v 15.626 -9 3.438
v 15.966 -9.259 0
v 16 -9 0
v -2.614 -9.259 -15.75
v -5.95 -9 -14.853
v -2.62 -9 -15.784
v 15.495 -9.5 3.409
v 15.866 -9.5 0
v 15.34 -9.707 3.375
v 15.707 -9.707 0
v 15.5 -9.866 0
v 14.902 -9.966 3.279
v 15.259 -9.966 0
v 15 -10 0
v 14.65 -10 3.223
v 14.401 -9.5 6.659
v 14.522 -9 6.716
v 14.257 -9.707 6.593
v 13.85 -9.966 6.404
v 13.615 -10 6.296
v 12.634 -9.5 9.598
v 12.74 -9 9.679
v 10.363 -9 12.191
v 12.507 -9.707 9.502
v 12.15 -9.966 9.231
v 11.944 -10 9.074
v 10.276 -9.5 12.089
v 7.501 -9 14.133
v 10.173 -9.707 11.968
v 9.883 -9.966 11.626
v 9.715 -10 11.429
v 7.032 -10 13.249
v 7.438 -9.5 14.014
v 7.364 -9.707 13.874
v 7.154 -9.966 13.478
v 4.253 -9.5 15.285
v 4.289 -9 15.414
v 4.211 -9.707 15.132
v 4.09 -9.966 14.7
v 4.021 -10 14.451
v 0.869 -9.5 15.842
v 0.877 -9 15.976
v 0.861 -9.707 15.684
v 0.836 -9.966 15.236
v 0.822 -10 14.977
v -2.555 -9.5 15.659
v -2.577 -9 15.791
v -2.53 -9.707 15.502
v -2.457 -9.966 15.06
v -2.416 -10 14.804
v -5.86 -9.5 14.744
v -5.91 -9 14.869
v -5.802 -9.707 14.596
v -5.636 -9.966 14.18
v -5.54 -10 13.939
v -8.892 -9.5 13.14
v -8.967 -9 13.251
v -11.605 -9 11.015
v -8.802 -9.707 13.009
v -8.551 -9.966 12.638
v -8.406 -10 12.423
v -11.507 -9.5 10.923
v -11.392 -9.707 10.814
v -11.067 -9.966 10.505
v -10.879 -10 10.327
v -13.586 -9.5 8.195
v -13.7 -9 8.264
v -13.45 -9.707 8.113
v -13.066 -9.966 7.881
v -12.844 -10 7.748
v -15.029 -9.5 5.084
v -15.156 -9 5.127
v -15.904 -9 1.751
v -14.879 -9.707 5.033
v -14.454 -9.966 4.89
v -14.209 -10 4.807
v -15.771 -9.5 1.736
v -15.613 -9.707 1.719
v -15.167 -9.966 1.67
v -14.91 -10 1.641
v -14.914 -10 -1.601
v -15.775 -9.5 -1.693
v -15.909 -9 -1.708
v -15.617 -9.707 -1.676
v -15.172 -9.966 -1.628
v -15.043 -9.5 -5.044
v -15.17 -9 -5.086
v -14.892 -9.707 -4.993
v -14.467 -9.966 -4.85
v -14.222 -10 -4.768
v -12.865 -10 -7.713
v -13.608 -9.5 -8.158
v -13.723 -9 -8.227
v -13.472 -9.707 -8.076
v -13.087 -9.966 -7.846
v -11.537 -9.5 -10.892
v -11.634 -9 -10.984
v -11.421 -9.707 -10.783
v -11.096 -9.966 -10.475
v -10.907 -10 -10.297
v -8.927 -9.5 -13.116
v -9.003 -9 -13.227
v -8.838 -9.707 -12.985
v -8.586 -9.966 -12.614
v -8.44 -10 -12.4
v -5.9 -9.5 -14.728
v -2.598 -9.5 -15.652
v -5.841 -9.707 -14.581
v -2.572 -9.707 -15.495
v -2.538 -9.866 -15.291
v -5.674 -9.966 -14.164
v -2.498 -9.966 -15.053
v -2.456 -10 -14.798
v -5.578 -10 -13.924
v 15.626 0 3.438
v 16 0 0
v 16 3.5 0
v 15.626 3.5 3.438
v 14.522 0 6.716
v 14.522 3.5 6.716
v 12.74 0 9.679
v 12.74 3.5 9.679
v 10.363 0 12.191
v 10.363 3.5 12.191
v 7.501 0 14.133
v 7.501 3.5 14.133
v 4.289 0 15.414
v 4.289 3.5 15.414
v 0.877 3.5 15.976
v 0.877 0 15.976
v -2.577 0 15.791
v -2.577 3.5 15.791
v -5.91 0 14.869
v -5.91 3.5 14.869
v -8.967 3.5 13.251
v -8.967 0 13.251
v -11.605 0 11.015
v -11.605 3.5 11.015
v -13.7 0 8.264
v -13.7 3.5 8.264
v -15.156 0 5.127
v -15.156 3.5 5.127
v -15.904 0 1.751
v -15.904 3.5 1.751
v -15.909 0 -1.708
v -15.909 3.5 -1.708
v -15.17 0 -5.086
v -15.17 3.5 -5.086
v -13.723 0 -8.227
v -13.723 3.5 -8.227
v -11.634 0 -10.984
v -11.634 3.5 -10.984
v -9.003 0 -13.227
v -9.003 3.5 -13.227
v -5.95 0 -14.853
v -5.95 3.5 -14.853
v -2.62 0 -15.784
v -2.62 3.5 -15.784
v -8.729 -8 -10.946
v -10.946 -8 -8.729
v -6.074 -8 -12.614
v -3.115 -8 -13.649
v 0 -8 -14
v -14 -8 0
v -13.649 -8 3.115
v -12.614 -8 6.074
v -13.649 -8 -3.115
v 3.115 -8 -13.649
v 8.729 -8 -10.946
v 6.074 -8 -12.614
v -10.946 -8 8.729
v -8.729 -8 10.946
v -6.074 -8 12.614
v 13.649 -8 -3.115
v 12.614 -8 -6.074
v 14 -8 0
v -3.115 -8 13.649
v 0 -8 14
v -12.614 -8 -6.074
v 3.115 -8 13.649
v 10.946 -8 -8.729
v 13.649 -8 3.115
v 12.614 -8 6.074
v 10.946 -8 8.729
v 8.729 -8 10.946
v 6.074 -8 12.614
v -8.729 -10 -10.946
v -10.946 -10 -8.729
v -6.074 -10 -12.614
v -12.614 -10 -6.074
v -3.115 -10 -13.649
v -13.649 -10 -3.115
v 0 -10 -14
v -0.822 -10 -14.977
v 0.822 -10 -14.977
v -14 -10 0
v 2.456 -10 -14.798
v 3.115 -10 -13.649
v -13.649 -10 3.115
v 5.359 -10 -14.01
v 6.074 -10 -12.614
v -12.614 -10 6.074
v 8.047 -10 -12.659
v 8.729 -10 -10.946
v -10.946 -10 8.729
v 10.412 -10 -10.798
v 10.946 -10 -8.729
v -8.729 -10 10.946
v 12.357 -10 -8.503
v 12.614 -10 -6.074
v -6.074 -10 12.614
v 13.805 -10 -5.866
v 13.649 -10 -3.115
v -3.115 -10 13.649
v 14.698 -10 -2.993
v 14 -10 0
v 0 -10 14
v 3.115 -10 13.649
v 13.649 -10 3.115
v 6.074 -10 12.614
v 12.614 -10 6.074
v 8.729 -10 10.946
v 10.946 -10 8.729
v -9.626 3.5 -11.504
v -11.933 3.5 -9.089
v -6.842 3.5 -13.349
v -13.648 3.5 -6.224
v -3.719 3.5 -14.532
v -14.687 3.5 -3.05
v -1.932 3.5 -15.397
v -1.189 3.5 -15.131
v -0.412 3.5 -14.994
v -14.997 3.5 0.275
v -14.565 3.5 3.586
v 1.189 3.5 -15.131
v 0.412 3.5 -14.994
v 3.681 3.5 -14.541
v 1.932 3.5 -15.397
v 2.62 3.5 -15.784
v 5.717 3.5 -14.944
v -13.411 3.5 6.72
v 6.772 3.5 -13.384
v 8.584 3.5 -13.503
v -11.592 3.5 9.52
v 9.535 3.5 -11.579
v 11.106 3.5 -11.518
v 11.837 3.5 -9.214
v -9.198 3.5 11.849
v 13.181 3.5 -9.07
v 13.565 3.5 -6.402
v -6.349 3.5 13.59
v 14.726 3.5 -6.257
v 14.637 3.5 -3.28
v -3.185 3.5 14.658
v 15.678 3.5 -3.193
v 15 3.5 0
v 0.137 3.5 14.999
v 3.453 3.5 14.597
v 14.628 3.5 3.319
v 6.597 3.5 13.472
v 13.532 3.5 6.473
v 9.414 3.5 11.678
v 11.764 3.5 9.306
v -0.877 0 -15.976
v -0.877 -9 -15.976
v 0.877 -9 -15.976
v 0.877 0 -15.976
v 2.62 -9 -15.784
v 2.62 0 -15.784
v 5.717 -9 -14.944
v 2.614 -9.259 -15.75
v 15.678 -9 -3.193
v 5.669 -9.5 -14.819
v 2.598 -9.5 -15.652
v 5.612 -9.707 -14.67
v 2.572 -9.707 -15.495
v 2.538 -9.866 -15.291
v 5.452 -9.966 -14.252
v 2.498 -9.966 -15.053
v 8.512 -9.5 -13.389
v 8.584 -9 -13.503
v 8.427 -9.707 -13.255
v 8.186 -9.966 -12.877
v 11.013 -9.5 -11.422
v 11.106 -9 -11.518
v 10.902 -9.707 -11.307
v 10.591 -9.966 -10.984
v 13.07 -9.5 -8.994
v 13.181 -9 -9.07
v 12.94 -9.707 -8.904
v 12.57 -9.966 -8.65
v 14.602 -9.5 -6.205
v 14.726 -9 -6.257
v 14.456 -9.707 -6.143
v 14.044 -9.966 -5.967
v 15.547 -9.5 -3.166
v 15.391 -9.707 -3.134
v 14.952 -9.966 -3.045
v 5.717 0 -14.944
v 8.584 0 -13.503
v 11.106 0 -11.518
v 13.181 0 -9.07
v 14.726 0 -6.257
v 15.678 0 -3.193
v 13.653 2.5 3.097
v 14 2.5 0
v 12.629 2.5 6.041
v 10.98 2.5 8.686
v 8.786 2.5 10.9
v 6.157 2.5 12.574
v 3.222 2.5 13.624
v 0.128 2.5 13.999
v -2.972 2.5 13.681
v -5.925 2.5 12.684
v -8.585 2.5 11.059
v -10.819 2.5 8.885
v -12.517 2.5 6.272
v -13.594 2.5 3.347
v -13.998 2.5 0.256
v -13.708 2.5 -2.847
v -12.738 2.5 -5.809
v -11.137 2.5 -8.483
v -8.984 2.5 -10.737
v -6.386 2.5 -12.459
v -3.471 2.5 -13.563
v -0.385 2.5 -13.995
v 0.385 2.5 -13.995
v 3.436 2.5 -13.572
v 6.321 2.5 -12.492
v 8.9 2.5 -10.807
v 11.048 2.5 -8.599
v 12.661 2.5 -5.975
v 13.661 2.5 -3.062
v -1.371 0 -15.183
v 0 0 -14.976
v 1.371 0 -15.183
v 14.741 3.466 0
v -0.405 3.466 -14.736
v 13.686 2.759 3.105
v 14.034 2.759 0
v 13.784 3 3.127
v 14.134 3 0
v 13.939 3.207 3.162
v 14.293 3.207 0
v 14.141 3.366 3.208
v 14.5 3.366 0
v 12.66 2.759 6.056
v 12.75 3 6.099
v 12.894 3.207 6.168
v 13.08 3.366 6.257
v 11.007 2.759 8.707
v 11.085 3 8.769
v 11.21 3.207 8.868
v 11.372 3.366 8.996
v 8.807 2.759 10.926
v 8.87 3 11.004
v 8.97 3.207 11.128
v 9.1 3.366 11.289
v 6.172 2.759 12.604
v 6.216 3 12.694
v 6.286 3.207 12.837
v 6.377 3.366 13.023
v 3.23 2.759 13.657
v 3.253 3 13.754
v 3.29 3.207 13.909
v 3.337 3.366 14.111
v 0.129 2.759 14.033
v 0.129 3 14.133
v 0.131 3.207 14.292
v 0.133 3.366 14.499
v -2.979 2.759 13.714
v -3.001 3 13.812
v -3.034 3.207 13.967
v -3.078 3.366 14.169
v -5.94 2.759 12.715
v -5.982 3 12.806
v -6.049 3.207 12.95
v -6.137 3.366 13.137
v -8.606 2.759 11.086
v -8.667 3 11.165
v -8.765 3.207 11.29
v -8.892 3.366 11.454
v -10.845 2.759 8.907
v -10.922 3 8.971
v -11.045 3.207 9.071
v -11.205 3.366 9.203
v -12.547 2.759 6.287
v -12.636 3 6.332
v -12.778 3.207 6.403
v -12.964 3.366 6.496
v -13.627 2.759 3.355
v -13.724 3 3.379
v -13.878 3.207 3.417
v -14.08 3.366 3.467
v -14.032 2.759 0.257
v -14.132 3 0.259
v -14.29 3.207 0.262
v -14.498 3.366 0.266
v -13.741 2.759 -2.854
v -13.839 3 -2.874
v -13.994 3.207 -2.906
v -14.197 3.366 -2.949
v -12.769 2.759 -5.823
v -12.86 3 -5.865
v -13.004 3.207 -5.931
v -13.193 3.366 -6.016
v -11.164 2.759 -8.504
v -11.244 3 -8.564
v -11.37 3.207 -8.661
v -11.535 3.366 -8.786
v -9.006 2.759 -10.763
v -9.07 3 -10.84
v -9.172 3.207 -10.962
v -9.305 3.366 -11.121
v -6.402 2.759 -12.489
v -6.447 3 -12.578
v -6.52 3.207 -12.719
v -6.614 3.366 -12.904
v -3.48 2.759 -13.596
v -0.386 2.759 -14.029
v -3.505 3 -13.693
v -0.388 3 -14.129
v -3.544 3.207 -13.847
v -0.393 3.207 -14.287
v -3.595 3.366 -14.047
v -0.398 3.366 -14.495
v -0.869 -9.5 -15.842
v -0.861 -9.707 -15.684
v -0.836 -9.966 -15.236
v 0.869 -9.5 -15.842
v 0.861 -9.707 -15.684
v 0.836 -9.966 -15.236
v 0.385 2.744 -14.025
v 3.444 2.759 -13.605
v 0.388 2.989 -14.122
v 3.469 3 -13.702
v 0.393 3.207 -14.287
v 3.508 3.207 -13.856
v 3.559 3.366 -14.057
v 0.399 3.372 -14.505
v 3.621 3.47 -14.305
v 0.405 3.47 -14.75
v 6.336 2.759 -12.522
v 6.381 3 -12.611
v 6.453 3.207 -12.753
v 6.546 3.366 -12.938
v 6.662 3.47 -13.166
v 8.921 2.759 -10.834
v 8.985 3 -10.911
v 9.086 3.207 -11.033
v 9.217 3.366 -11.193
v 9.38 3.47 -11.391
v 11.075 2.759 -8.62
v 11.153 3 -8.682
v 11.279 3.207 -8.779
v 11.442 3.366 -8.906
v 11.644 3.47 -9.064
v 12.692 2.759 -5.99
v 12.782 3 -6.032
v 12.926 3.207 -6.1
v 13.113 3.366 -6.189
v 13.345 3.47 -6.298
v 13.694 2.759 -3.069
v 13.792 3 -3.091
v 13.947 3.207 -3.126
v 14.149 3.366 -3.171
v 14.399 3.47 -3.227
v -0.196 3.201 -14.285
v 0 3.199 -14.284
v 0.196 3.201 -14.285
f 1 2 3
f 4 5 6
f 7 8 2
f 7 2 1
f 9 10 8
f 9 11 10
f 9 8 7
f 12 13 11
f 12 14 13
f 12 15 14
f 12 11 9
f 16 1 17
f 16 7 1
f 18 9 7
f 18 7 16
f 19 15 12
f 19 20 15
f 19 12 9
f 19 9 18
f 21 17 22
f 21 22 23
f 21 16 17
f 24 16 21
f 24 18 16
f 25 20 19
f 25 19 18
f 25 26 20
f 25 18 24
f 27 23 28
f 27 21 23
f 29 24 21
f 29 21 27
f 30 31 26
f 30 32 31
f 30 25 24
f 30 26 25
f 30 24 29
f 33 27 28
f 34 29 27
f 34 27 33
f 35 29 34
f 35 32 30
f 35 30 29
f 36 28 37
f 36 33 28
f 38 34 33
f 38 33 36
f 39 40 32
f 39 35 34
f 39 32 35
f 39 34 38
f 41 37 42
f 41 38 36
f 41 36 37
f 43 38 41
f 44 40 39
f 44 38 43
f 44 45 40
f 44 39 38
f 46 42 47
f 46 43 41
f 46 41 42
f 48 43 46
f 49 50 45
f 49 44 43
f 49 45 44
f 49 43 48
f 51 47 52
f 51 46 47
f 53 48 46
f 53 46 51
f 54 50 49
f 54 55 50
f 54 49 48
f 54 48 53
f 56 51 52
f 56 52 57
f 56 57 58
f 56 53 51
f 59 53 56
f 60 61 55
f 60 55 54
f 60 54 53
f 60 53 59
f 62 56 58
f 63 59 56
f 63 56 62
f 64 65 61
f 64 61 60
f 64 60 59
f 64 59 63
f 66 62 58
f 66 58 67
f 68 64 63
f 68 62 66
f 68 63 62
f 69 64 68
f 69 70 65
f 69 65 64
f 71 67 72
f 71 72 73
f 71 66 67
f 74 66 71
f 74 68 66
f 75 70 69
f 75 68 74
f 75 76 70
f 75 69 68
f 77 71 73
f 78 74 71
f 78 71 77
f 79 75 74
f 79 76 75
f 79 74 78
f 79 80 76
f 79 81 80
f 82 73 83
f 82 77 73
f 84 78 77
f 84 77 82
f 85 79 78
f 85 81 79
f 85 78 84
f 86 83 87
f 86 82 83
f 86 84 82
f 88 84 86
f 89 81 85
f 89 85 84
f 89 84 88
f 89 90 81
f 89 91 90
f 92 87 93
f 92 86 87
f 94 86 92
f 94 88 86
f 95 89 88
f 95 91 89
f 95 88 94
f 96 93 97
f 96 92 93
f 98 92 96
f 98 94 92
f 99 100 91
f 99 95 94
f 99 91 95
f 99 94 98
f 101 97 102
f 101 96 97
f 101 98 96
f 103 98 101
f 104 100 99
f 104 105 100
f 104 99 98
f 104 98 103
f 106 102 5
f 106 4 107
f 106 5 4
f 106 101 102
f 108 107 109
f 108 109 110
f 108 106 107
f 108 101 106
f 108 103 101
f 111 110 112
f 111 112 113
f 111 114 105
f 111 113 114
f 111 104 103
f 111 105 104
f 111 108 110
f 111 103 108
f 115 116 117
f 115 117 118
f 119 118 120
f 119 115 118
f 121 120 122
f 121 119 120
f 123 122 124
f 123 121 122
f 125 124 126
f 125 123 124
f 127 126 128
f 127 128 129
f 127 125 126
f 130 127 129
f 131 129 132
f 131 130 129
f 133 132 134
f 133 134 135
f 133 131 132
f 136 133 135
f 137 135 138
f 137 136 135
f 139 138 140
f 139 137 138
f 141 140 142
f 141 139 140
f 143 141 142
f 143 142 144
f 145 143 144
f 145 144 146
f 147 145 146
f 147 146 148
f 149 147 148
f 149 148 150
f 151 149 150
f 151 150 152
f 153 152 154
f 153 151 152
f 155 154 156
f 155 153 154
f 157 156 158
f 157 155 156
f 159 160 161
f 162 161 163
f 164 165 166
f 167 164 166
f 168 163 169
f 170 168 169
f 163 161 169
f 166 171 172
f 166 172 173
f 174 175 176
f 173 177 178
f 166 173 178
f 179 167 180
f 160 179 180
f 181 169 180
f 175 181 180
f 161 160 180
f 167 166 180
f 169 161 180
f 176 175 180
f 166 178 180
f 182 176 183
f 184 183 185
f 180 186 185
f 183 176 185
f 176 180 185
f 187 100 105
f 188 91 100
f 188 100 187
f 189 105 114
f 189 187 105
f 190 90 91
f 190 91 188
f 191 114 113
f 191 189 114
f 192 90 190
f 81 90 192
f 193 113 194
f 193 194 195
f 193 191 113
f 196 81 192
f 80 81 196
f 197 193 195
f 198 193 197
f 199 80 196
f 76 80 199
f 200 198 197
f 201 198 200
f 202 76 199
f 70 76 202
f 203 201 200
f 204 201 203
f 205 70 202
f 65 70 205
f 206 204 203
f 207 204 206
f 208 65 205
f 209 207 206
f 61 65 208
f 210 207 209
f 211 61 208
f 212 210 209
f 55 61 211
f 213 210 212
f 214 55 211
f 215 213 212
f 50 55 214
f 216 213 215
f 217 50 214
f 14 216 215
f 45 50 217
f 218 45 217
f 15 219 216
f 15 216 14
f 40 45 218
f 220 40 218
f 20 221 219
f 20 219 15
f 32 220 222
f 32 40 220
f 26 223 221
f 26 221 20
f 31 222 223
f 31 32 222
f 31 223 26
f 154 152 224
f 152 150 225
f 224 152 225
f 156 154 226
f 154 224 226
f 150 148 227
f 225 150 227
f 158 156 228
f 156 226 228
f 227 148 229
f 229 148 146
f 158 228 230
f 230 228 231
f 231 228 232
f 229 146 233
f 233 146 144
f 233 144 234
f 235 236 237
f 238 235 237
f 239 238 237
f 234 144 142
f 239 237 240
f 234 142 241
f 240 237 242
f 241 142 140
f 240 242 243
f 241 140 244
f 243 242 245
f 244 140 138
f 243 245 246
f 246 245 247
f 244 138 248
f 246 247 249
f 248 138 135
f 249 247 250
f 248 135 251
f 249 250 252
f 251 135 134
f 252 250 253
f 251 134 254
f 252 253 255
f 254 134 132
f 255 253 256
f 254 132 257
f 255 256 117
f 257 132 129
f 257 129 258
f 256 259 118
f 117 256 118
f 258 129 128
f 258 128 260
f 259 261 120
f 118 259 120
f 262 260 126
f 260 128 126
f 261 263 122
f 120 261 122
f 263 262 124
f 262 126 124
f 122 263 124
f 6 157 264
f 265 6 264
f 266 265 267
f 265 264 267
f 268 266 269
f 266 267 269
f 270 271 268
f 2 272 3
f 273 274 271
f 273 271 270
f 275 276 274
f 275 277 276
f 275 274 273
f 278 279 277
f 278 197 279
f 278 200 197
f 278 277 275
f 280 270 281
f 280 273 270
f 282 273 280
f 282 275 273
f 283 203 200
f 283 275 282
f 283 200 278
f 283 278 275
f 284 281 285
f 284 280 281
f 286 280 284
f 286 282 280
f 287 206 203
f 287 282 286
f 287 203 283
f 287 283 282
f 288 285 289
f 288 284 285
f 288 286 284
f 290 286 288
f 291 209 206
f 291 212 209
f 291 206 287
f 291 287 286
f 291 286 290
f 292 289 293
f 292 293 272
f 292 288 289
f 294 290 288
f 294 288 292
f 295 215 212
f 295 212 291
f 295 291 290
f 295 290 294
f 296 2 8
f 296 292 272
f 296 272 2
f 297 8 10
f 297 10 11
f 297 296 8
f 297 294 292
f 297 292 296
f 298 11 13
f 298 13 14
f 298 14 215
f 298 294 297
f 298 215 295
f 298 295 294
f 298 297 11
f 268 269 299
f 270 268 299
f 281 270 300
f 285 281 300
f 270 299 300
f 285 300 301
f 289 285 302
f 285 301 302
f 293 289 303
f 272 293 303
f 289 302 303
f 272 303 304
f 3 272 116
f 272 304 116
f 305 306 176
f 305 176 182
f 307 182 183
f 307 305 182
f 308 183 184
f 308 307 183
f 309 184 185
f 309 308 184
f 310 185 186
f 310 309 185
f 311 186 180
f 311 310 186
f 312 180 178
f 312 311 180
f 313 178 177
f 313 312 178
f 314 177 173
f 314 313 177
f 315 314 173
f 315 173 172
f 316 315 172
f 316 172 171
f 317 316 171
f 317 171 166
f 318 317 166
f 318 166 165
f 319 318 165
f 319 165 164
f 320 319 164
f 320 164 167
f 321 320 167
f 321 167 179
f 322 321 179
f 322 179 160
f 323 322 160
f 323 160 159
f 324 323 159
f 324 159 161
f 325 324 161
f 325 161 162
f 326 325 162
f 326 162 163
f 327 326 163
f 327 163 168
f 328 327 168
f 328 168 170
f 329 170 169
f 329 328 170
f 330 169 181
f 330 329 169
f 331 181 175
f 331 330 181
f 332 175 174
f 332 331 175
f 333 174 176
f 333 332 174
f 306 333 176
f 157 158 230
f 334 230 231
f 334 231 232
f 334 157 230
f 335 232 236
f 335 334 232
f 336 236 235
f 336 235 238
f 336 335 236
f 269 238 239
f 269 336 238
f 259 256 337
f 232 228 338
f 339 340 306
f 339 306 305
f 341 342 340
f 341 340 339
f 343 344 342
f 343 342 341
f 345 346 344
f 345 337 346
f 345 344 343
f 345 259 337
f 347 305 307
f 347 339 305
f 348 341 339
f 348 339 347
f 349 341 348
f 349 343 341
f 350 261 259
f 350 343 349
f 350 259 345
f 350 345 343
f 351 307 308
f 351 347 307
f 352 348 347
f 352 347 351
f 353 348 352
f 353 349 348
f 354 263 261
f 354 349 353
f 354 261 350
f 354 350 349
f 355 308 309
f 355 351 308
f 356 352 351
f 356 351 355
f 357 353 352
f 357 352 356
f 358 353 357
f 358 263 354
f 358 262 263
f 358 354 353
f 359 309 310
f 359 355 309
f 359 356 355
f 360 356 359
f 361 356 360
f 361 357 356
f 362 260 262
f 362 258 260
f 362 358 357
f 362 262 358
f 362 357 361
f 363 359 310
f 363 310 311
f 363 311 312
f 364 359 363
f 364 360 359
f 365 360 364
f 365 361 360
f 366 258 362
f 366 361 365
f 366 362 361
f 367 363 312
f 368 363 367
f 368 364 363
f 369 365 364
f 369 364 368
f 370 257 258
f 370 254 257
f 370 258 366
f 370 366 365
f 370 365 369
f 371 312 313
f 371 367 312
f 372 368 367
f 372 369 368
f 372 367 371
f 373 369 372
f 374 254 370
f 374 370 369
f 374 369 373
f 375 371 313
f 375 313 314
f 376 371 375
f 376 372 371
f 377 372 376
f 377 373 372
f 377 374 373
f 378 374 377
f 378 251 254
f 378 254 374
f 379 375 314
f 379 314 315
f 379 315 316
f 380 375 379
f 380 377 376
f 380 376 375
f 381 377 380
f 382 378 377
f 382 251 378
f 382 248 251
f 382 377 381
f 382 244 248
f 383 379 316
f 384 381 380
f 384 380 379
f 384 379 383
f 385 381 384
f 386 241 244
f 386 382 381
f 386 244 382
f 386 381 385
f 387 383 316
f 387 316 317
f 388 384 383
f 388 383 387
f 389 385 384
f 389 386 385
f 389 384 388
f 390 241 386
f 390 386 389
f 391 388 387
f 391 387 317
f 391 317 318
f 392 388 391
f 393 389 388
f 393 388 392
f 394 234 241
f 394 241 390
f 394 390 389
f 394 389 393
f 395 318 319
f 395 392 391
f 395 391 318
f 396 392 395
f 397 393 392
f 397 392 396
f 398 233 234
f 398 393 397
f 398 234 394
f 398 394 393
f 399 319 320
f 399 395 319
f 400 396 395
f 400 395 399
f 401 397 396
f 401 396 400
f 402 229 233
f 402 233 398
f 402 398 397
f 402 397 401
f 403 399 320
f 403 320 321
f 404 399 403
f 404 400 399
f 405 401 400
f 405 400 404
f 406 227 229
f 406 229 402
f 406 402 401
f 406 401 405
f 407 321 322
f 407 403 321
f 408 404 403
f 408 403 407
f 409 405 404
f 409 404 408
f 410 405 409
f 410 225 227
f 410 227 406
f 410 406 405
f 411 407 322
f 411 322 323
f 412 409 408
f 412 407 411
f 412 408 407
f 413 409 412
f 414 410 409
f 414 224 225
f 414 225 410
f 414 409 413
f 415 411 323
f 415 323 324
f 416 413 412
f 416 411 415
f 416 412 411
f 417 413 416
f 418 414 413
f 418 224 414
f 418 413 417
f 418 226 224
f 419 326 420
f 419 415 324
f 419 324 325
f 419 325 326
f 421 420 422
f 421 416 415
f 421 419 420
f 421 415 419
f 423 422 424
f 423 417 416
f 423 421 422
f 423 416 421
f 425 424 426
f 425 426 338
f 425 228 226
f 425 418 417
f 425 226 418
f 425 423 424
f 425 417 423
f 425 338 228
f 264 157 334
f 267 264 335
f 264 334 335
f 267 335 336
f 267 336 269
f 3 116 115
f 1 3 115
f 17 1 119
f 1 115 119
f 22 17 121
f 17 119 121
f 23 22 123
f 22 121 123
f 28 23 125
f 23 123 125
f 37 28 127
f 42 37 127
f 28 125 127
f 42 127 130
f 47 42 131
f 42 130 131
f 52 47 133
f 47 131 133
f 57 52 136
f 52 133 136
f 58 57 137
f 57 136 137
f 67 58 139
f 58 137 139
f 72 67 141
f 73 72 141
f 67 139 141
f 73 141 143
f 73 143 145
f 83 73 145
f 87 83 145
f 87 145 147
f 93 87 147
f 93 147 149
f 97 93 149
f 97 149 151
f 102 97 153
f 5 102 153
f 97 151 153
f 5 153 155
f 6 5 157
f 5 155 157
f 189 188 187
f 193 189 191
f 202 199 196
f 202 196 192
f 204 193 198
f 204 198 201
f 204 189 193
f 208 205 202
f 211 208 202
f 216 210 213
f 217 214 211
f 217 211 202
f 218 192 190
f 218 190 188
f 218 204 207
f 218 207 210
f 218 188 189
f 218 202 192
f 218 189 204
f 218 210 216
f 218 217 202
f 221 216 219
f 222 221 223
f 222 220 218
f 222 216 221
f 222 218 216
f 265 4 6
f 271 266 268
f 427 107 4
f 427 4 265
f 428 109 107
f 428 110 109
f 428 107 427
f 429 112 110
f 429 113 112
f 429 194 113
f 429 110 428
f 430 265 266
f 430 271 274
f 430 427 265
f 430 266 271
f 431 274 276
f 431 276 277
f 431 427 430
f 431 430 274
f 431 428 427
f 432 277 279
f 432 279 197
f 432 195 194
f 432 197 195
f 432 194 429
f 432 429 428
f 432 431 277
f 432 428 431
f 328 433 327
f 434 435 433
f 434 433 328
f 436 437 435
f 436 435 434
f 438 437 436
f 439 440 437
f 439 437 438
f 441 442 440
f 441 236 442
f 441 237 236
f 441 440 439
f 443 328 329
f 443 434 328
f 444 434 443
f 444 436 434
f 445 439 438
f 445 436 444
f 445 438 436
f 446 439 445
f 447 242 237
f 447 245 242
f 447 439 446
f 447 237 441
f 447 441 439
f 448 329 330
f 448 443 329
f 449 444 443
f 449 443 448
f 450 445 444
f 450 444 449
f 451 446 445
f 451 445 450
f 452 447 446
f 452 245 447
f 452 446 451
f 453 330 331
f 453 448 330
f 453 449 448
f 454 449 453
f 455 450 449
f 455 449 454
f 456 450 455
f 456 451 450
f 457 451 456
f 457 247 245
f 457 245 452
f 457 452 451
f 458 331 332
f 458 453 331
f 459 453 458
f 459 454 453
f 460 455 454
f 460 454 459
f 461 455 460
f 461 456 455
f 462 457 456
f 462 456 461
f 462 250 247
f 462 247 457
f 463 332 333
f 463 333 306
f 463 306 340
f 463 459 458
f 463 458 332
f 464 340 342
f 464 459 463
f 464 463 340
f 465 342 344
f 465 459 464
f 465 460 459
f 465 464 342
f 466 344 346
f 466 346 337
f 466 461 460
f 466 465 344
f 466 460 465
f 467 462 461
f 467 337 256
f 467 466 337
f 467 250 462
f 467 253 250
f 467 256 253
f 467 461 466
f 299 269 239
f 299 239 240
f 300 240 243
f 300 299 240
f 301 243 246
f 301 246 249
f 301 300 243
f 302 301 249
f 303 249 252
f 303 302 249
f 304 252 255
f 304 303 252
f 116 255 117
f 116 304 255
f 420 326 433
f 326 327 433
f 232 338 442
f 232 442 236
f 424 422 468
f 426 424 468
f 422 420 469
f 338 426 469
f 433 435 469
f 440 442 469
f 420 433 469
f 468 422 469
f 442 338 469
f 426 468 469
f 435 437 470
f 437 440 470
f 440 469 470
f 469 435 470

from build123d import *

# Parameters (mm, degrees)
F0_R     = 14
F1_DEPTH = 3.5
F2_DEPTH = 10
F3_START = 8
F3_DEPTH = 2
F4_R     = 1


with BuildPart() as f1:
    # F0 (on Front) → F1 (new body)
    with BuildSketch(Plane.XZ):
        with BuildLine():
            ThreePointArc((2.6195479008, -15.7841049412), (12.2047688715, -10.3461885153), (16, 0))
            ThreePointArc((16, 0), (-10.3461885153, 12.2047688715), (-2.6195479008, -15.7841049412))
            ThreePointArc((-2.6195479008, -15.7841049412), (0, -14.9760404944), (2.6195479008, -15.7841049412))
        make_face()
        Circle(F0_R, mode=Mode.SUBTRACT)
    extrude(amount=-F1_DEPTH)

    # F0 (on Front) → F2 (join)
    with BuildSketch(Plane.XZ):
        with BuildLine():
            ThreePointArc((2.6195479008, -15.7841049412), (0, -14.9760404944), (-2.6195479008, -15.7841049412))
            ThreePointArc((-2.6195479008, -15.7841049412), (0, -16), (2.6195479008, -15.7841049412))
        make_face()
        with BuildLine():
            ThreePointArc((2.6195479008, -15.7841049412), (12.2047688715, -10.3461885153), (16, 0))
            ThreePointArc((16, 0), (-10.3461885153, 12.2047688715), (-2.6195479008, -15.7841049412))
            ThreePointArc((-2.6195479008, -15.7841049412), (0, -14.9760404944), (2.6195479008, -15.7841049412))
        make_face()
        Circle(F0_R, mode=Mode.SUBTRACT)
    extrude(amount=F2_DEPTH)

    # F0 (on Front) → F3 (join)
    with BuildSketch(Plane.XZ.offset(F3_START)):
        Circle(F0_R)
    extrude(amount=F3_DEPTH)

    # F4
    f4_edges = [f1.edges().sort_by_distance(p)[0] for p in [
        (-2.619548, -10, 15.784105),
        (-14, 3.5, 0),
    ]]
    fillet(f4_edges, radius=F4_R)


solid = f1.part
